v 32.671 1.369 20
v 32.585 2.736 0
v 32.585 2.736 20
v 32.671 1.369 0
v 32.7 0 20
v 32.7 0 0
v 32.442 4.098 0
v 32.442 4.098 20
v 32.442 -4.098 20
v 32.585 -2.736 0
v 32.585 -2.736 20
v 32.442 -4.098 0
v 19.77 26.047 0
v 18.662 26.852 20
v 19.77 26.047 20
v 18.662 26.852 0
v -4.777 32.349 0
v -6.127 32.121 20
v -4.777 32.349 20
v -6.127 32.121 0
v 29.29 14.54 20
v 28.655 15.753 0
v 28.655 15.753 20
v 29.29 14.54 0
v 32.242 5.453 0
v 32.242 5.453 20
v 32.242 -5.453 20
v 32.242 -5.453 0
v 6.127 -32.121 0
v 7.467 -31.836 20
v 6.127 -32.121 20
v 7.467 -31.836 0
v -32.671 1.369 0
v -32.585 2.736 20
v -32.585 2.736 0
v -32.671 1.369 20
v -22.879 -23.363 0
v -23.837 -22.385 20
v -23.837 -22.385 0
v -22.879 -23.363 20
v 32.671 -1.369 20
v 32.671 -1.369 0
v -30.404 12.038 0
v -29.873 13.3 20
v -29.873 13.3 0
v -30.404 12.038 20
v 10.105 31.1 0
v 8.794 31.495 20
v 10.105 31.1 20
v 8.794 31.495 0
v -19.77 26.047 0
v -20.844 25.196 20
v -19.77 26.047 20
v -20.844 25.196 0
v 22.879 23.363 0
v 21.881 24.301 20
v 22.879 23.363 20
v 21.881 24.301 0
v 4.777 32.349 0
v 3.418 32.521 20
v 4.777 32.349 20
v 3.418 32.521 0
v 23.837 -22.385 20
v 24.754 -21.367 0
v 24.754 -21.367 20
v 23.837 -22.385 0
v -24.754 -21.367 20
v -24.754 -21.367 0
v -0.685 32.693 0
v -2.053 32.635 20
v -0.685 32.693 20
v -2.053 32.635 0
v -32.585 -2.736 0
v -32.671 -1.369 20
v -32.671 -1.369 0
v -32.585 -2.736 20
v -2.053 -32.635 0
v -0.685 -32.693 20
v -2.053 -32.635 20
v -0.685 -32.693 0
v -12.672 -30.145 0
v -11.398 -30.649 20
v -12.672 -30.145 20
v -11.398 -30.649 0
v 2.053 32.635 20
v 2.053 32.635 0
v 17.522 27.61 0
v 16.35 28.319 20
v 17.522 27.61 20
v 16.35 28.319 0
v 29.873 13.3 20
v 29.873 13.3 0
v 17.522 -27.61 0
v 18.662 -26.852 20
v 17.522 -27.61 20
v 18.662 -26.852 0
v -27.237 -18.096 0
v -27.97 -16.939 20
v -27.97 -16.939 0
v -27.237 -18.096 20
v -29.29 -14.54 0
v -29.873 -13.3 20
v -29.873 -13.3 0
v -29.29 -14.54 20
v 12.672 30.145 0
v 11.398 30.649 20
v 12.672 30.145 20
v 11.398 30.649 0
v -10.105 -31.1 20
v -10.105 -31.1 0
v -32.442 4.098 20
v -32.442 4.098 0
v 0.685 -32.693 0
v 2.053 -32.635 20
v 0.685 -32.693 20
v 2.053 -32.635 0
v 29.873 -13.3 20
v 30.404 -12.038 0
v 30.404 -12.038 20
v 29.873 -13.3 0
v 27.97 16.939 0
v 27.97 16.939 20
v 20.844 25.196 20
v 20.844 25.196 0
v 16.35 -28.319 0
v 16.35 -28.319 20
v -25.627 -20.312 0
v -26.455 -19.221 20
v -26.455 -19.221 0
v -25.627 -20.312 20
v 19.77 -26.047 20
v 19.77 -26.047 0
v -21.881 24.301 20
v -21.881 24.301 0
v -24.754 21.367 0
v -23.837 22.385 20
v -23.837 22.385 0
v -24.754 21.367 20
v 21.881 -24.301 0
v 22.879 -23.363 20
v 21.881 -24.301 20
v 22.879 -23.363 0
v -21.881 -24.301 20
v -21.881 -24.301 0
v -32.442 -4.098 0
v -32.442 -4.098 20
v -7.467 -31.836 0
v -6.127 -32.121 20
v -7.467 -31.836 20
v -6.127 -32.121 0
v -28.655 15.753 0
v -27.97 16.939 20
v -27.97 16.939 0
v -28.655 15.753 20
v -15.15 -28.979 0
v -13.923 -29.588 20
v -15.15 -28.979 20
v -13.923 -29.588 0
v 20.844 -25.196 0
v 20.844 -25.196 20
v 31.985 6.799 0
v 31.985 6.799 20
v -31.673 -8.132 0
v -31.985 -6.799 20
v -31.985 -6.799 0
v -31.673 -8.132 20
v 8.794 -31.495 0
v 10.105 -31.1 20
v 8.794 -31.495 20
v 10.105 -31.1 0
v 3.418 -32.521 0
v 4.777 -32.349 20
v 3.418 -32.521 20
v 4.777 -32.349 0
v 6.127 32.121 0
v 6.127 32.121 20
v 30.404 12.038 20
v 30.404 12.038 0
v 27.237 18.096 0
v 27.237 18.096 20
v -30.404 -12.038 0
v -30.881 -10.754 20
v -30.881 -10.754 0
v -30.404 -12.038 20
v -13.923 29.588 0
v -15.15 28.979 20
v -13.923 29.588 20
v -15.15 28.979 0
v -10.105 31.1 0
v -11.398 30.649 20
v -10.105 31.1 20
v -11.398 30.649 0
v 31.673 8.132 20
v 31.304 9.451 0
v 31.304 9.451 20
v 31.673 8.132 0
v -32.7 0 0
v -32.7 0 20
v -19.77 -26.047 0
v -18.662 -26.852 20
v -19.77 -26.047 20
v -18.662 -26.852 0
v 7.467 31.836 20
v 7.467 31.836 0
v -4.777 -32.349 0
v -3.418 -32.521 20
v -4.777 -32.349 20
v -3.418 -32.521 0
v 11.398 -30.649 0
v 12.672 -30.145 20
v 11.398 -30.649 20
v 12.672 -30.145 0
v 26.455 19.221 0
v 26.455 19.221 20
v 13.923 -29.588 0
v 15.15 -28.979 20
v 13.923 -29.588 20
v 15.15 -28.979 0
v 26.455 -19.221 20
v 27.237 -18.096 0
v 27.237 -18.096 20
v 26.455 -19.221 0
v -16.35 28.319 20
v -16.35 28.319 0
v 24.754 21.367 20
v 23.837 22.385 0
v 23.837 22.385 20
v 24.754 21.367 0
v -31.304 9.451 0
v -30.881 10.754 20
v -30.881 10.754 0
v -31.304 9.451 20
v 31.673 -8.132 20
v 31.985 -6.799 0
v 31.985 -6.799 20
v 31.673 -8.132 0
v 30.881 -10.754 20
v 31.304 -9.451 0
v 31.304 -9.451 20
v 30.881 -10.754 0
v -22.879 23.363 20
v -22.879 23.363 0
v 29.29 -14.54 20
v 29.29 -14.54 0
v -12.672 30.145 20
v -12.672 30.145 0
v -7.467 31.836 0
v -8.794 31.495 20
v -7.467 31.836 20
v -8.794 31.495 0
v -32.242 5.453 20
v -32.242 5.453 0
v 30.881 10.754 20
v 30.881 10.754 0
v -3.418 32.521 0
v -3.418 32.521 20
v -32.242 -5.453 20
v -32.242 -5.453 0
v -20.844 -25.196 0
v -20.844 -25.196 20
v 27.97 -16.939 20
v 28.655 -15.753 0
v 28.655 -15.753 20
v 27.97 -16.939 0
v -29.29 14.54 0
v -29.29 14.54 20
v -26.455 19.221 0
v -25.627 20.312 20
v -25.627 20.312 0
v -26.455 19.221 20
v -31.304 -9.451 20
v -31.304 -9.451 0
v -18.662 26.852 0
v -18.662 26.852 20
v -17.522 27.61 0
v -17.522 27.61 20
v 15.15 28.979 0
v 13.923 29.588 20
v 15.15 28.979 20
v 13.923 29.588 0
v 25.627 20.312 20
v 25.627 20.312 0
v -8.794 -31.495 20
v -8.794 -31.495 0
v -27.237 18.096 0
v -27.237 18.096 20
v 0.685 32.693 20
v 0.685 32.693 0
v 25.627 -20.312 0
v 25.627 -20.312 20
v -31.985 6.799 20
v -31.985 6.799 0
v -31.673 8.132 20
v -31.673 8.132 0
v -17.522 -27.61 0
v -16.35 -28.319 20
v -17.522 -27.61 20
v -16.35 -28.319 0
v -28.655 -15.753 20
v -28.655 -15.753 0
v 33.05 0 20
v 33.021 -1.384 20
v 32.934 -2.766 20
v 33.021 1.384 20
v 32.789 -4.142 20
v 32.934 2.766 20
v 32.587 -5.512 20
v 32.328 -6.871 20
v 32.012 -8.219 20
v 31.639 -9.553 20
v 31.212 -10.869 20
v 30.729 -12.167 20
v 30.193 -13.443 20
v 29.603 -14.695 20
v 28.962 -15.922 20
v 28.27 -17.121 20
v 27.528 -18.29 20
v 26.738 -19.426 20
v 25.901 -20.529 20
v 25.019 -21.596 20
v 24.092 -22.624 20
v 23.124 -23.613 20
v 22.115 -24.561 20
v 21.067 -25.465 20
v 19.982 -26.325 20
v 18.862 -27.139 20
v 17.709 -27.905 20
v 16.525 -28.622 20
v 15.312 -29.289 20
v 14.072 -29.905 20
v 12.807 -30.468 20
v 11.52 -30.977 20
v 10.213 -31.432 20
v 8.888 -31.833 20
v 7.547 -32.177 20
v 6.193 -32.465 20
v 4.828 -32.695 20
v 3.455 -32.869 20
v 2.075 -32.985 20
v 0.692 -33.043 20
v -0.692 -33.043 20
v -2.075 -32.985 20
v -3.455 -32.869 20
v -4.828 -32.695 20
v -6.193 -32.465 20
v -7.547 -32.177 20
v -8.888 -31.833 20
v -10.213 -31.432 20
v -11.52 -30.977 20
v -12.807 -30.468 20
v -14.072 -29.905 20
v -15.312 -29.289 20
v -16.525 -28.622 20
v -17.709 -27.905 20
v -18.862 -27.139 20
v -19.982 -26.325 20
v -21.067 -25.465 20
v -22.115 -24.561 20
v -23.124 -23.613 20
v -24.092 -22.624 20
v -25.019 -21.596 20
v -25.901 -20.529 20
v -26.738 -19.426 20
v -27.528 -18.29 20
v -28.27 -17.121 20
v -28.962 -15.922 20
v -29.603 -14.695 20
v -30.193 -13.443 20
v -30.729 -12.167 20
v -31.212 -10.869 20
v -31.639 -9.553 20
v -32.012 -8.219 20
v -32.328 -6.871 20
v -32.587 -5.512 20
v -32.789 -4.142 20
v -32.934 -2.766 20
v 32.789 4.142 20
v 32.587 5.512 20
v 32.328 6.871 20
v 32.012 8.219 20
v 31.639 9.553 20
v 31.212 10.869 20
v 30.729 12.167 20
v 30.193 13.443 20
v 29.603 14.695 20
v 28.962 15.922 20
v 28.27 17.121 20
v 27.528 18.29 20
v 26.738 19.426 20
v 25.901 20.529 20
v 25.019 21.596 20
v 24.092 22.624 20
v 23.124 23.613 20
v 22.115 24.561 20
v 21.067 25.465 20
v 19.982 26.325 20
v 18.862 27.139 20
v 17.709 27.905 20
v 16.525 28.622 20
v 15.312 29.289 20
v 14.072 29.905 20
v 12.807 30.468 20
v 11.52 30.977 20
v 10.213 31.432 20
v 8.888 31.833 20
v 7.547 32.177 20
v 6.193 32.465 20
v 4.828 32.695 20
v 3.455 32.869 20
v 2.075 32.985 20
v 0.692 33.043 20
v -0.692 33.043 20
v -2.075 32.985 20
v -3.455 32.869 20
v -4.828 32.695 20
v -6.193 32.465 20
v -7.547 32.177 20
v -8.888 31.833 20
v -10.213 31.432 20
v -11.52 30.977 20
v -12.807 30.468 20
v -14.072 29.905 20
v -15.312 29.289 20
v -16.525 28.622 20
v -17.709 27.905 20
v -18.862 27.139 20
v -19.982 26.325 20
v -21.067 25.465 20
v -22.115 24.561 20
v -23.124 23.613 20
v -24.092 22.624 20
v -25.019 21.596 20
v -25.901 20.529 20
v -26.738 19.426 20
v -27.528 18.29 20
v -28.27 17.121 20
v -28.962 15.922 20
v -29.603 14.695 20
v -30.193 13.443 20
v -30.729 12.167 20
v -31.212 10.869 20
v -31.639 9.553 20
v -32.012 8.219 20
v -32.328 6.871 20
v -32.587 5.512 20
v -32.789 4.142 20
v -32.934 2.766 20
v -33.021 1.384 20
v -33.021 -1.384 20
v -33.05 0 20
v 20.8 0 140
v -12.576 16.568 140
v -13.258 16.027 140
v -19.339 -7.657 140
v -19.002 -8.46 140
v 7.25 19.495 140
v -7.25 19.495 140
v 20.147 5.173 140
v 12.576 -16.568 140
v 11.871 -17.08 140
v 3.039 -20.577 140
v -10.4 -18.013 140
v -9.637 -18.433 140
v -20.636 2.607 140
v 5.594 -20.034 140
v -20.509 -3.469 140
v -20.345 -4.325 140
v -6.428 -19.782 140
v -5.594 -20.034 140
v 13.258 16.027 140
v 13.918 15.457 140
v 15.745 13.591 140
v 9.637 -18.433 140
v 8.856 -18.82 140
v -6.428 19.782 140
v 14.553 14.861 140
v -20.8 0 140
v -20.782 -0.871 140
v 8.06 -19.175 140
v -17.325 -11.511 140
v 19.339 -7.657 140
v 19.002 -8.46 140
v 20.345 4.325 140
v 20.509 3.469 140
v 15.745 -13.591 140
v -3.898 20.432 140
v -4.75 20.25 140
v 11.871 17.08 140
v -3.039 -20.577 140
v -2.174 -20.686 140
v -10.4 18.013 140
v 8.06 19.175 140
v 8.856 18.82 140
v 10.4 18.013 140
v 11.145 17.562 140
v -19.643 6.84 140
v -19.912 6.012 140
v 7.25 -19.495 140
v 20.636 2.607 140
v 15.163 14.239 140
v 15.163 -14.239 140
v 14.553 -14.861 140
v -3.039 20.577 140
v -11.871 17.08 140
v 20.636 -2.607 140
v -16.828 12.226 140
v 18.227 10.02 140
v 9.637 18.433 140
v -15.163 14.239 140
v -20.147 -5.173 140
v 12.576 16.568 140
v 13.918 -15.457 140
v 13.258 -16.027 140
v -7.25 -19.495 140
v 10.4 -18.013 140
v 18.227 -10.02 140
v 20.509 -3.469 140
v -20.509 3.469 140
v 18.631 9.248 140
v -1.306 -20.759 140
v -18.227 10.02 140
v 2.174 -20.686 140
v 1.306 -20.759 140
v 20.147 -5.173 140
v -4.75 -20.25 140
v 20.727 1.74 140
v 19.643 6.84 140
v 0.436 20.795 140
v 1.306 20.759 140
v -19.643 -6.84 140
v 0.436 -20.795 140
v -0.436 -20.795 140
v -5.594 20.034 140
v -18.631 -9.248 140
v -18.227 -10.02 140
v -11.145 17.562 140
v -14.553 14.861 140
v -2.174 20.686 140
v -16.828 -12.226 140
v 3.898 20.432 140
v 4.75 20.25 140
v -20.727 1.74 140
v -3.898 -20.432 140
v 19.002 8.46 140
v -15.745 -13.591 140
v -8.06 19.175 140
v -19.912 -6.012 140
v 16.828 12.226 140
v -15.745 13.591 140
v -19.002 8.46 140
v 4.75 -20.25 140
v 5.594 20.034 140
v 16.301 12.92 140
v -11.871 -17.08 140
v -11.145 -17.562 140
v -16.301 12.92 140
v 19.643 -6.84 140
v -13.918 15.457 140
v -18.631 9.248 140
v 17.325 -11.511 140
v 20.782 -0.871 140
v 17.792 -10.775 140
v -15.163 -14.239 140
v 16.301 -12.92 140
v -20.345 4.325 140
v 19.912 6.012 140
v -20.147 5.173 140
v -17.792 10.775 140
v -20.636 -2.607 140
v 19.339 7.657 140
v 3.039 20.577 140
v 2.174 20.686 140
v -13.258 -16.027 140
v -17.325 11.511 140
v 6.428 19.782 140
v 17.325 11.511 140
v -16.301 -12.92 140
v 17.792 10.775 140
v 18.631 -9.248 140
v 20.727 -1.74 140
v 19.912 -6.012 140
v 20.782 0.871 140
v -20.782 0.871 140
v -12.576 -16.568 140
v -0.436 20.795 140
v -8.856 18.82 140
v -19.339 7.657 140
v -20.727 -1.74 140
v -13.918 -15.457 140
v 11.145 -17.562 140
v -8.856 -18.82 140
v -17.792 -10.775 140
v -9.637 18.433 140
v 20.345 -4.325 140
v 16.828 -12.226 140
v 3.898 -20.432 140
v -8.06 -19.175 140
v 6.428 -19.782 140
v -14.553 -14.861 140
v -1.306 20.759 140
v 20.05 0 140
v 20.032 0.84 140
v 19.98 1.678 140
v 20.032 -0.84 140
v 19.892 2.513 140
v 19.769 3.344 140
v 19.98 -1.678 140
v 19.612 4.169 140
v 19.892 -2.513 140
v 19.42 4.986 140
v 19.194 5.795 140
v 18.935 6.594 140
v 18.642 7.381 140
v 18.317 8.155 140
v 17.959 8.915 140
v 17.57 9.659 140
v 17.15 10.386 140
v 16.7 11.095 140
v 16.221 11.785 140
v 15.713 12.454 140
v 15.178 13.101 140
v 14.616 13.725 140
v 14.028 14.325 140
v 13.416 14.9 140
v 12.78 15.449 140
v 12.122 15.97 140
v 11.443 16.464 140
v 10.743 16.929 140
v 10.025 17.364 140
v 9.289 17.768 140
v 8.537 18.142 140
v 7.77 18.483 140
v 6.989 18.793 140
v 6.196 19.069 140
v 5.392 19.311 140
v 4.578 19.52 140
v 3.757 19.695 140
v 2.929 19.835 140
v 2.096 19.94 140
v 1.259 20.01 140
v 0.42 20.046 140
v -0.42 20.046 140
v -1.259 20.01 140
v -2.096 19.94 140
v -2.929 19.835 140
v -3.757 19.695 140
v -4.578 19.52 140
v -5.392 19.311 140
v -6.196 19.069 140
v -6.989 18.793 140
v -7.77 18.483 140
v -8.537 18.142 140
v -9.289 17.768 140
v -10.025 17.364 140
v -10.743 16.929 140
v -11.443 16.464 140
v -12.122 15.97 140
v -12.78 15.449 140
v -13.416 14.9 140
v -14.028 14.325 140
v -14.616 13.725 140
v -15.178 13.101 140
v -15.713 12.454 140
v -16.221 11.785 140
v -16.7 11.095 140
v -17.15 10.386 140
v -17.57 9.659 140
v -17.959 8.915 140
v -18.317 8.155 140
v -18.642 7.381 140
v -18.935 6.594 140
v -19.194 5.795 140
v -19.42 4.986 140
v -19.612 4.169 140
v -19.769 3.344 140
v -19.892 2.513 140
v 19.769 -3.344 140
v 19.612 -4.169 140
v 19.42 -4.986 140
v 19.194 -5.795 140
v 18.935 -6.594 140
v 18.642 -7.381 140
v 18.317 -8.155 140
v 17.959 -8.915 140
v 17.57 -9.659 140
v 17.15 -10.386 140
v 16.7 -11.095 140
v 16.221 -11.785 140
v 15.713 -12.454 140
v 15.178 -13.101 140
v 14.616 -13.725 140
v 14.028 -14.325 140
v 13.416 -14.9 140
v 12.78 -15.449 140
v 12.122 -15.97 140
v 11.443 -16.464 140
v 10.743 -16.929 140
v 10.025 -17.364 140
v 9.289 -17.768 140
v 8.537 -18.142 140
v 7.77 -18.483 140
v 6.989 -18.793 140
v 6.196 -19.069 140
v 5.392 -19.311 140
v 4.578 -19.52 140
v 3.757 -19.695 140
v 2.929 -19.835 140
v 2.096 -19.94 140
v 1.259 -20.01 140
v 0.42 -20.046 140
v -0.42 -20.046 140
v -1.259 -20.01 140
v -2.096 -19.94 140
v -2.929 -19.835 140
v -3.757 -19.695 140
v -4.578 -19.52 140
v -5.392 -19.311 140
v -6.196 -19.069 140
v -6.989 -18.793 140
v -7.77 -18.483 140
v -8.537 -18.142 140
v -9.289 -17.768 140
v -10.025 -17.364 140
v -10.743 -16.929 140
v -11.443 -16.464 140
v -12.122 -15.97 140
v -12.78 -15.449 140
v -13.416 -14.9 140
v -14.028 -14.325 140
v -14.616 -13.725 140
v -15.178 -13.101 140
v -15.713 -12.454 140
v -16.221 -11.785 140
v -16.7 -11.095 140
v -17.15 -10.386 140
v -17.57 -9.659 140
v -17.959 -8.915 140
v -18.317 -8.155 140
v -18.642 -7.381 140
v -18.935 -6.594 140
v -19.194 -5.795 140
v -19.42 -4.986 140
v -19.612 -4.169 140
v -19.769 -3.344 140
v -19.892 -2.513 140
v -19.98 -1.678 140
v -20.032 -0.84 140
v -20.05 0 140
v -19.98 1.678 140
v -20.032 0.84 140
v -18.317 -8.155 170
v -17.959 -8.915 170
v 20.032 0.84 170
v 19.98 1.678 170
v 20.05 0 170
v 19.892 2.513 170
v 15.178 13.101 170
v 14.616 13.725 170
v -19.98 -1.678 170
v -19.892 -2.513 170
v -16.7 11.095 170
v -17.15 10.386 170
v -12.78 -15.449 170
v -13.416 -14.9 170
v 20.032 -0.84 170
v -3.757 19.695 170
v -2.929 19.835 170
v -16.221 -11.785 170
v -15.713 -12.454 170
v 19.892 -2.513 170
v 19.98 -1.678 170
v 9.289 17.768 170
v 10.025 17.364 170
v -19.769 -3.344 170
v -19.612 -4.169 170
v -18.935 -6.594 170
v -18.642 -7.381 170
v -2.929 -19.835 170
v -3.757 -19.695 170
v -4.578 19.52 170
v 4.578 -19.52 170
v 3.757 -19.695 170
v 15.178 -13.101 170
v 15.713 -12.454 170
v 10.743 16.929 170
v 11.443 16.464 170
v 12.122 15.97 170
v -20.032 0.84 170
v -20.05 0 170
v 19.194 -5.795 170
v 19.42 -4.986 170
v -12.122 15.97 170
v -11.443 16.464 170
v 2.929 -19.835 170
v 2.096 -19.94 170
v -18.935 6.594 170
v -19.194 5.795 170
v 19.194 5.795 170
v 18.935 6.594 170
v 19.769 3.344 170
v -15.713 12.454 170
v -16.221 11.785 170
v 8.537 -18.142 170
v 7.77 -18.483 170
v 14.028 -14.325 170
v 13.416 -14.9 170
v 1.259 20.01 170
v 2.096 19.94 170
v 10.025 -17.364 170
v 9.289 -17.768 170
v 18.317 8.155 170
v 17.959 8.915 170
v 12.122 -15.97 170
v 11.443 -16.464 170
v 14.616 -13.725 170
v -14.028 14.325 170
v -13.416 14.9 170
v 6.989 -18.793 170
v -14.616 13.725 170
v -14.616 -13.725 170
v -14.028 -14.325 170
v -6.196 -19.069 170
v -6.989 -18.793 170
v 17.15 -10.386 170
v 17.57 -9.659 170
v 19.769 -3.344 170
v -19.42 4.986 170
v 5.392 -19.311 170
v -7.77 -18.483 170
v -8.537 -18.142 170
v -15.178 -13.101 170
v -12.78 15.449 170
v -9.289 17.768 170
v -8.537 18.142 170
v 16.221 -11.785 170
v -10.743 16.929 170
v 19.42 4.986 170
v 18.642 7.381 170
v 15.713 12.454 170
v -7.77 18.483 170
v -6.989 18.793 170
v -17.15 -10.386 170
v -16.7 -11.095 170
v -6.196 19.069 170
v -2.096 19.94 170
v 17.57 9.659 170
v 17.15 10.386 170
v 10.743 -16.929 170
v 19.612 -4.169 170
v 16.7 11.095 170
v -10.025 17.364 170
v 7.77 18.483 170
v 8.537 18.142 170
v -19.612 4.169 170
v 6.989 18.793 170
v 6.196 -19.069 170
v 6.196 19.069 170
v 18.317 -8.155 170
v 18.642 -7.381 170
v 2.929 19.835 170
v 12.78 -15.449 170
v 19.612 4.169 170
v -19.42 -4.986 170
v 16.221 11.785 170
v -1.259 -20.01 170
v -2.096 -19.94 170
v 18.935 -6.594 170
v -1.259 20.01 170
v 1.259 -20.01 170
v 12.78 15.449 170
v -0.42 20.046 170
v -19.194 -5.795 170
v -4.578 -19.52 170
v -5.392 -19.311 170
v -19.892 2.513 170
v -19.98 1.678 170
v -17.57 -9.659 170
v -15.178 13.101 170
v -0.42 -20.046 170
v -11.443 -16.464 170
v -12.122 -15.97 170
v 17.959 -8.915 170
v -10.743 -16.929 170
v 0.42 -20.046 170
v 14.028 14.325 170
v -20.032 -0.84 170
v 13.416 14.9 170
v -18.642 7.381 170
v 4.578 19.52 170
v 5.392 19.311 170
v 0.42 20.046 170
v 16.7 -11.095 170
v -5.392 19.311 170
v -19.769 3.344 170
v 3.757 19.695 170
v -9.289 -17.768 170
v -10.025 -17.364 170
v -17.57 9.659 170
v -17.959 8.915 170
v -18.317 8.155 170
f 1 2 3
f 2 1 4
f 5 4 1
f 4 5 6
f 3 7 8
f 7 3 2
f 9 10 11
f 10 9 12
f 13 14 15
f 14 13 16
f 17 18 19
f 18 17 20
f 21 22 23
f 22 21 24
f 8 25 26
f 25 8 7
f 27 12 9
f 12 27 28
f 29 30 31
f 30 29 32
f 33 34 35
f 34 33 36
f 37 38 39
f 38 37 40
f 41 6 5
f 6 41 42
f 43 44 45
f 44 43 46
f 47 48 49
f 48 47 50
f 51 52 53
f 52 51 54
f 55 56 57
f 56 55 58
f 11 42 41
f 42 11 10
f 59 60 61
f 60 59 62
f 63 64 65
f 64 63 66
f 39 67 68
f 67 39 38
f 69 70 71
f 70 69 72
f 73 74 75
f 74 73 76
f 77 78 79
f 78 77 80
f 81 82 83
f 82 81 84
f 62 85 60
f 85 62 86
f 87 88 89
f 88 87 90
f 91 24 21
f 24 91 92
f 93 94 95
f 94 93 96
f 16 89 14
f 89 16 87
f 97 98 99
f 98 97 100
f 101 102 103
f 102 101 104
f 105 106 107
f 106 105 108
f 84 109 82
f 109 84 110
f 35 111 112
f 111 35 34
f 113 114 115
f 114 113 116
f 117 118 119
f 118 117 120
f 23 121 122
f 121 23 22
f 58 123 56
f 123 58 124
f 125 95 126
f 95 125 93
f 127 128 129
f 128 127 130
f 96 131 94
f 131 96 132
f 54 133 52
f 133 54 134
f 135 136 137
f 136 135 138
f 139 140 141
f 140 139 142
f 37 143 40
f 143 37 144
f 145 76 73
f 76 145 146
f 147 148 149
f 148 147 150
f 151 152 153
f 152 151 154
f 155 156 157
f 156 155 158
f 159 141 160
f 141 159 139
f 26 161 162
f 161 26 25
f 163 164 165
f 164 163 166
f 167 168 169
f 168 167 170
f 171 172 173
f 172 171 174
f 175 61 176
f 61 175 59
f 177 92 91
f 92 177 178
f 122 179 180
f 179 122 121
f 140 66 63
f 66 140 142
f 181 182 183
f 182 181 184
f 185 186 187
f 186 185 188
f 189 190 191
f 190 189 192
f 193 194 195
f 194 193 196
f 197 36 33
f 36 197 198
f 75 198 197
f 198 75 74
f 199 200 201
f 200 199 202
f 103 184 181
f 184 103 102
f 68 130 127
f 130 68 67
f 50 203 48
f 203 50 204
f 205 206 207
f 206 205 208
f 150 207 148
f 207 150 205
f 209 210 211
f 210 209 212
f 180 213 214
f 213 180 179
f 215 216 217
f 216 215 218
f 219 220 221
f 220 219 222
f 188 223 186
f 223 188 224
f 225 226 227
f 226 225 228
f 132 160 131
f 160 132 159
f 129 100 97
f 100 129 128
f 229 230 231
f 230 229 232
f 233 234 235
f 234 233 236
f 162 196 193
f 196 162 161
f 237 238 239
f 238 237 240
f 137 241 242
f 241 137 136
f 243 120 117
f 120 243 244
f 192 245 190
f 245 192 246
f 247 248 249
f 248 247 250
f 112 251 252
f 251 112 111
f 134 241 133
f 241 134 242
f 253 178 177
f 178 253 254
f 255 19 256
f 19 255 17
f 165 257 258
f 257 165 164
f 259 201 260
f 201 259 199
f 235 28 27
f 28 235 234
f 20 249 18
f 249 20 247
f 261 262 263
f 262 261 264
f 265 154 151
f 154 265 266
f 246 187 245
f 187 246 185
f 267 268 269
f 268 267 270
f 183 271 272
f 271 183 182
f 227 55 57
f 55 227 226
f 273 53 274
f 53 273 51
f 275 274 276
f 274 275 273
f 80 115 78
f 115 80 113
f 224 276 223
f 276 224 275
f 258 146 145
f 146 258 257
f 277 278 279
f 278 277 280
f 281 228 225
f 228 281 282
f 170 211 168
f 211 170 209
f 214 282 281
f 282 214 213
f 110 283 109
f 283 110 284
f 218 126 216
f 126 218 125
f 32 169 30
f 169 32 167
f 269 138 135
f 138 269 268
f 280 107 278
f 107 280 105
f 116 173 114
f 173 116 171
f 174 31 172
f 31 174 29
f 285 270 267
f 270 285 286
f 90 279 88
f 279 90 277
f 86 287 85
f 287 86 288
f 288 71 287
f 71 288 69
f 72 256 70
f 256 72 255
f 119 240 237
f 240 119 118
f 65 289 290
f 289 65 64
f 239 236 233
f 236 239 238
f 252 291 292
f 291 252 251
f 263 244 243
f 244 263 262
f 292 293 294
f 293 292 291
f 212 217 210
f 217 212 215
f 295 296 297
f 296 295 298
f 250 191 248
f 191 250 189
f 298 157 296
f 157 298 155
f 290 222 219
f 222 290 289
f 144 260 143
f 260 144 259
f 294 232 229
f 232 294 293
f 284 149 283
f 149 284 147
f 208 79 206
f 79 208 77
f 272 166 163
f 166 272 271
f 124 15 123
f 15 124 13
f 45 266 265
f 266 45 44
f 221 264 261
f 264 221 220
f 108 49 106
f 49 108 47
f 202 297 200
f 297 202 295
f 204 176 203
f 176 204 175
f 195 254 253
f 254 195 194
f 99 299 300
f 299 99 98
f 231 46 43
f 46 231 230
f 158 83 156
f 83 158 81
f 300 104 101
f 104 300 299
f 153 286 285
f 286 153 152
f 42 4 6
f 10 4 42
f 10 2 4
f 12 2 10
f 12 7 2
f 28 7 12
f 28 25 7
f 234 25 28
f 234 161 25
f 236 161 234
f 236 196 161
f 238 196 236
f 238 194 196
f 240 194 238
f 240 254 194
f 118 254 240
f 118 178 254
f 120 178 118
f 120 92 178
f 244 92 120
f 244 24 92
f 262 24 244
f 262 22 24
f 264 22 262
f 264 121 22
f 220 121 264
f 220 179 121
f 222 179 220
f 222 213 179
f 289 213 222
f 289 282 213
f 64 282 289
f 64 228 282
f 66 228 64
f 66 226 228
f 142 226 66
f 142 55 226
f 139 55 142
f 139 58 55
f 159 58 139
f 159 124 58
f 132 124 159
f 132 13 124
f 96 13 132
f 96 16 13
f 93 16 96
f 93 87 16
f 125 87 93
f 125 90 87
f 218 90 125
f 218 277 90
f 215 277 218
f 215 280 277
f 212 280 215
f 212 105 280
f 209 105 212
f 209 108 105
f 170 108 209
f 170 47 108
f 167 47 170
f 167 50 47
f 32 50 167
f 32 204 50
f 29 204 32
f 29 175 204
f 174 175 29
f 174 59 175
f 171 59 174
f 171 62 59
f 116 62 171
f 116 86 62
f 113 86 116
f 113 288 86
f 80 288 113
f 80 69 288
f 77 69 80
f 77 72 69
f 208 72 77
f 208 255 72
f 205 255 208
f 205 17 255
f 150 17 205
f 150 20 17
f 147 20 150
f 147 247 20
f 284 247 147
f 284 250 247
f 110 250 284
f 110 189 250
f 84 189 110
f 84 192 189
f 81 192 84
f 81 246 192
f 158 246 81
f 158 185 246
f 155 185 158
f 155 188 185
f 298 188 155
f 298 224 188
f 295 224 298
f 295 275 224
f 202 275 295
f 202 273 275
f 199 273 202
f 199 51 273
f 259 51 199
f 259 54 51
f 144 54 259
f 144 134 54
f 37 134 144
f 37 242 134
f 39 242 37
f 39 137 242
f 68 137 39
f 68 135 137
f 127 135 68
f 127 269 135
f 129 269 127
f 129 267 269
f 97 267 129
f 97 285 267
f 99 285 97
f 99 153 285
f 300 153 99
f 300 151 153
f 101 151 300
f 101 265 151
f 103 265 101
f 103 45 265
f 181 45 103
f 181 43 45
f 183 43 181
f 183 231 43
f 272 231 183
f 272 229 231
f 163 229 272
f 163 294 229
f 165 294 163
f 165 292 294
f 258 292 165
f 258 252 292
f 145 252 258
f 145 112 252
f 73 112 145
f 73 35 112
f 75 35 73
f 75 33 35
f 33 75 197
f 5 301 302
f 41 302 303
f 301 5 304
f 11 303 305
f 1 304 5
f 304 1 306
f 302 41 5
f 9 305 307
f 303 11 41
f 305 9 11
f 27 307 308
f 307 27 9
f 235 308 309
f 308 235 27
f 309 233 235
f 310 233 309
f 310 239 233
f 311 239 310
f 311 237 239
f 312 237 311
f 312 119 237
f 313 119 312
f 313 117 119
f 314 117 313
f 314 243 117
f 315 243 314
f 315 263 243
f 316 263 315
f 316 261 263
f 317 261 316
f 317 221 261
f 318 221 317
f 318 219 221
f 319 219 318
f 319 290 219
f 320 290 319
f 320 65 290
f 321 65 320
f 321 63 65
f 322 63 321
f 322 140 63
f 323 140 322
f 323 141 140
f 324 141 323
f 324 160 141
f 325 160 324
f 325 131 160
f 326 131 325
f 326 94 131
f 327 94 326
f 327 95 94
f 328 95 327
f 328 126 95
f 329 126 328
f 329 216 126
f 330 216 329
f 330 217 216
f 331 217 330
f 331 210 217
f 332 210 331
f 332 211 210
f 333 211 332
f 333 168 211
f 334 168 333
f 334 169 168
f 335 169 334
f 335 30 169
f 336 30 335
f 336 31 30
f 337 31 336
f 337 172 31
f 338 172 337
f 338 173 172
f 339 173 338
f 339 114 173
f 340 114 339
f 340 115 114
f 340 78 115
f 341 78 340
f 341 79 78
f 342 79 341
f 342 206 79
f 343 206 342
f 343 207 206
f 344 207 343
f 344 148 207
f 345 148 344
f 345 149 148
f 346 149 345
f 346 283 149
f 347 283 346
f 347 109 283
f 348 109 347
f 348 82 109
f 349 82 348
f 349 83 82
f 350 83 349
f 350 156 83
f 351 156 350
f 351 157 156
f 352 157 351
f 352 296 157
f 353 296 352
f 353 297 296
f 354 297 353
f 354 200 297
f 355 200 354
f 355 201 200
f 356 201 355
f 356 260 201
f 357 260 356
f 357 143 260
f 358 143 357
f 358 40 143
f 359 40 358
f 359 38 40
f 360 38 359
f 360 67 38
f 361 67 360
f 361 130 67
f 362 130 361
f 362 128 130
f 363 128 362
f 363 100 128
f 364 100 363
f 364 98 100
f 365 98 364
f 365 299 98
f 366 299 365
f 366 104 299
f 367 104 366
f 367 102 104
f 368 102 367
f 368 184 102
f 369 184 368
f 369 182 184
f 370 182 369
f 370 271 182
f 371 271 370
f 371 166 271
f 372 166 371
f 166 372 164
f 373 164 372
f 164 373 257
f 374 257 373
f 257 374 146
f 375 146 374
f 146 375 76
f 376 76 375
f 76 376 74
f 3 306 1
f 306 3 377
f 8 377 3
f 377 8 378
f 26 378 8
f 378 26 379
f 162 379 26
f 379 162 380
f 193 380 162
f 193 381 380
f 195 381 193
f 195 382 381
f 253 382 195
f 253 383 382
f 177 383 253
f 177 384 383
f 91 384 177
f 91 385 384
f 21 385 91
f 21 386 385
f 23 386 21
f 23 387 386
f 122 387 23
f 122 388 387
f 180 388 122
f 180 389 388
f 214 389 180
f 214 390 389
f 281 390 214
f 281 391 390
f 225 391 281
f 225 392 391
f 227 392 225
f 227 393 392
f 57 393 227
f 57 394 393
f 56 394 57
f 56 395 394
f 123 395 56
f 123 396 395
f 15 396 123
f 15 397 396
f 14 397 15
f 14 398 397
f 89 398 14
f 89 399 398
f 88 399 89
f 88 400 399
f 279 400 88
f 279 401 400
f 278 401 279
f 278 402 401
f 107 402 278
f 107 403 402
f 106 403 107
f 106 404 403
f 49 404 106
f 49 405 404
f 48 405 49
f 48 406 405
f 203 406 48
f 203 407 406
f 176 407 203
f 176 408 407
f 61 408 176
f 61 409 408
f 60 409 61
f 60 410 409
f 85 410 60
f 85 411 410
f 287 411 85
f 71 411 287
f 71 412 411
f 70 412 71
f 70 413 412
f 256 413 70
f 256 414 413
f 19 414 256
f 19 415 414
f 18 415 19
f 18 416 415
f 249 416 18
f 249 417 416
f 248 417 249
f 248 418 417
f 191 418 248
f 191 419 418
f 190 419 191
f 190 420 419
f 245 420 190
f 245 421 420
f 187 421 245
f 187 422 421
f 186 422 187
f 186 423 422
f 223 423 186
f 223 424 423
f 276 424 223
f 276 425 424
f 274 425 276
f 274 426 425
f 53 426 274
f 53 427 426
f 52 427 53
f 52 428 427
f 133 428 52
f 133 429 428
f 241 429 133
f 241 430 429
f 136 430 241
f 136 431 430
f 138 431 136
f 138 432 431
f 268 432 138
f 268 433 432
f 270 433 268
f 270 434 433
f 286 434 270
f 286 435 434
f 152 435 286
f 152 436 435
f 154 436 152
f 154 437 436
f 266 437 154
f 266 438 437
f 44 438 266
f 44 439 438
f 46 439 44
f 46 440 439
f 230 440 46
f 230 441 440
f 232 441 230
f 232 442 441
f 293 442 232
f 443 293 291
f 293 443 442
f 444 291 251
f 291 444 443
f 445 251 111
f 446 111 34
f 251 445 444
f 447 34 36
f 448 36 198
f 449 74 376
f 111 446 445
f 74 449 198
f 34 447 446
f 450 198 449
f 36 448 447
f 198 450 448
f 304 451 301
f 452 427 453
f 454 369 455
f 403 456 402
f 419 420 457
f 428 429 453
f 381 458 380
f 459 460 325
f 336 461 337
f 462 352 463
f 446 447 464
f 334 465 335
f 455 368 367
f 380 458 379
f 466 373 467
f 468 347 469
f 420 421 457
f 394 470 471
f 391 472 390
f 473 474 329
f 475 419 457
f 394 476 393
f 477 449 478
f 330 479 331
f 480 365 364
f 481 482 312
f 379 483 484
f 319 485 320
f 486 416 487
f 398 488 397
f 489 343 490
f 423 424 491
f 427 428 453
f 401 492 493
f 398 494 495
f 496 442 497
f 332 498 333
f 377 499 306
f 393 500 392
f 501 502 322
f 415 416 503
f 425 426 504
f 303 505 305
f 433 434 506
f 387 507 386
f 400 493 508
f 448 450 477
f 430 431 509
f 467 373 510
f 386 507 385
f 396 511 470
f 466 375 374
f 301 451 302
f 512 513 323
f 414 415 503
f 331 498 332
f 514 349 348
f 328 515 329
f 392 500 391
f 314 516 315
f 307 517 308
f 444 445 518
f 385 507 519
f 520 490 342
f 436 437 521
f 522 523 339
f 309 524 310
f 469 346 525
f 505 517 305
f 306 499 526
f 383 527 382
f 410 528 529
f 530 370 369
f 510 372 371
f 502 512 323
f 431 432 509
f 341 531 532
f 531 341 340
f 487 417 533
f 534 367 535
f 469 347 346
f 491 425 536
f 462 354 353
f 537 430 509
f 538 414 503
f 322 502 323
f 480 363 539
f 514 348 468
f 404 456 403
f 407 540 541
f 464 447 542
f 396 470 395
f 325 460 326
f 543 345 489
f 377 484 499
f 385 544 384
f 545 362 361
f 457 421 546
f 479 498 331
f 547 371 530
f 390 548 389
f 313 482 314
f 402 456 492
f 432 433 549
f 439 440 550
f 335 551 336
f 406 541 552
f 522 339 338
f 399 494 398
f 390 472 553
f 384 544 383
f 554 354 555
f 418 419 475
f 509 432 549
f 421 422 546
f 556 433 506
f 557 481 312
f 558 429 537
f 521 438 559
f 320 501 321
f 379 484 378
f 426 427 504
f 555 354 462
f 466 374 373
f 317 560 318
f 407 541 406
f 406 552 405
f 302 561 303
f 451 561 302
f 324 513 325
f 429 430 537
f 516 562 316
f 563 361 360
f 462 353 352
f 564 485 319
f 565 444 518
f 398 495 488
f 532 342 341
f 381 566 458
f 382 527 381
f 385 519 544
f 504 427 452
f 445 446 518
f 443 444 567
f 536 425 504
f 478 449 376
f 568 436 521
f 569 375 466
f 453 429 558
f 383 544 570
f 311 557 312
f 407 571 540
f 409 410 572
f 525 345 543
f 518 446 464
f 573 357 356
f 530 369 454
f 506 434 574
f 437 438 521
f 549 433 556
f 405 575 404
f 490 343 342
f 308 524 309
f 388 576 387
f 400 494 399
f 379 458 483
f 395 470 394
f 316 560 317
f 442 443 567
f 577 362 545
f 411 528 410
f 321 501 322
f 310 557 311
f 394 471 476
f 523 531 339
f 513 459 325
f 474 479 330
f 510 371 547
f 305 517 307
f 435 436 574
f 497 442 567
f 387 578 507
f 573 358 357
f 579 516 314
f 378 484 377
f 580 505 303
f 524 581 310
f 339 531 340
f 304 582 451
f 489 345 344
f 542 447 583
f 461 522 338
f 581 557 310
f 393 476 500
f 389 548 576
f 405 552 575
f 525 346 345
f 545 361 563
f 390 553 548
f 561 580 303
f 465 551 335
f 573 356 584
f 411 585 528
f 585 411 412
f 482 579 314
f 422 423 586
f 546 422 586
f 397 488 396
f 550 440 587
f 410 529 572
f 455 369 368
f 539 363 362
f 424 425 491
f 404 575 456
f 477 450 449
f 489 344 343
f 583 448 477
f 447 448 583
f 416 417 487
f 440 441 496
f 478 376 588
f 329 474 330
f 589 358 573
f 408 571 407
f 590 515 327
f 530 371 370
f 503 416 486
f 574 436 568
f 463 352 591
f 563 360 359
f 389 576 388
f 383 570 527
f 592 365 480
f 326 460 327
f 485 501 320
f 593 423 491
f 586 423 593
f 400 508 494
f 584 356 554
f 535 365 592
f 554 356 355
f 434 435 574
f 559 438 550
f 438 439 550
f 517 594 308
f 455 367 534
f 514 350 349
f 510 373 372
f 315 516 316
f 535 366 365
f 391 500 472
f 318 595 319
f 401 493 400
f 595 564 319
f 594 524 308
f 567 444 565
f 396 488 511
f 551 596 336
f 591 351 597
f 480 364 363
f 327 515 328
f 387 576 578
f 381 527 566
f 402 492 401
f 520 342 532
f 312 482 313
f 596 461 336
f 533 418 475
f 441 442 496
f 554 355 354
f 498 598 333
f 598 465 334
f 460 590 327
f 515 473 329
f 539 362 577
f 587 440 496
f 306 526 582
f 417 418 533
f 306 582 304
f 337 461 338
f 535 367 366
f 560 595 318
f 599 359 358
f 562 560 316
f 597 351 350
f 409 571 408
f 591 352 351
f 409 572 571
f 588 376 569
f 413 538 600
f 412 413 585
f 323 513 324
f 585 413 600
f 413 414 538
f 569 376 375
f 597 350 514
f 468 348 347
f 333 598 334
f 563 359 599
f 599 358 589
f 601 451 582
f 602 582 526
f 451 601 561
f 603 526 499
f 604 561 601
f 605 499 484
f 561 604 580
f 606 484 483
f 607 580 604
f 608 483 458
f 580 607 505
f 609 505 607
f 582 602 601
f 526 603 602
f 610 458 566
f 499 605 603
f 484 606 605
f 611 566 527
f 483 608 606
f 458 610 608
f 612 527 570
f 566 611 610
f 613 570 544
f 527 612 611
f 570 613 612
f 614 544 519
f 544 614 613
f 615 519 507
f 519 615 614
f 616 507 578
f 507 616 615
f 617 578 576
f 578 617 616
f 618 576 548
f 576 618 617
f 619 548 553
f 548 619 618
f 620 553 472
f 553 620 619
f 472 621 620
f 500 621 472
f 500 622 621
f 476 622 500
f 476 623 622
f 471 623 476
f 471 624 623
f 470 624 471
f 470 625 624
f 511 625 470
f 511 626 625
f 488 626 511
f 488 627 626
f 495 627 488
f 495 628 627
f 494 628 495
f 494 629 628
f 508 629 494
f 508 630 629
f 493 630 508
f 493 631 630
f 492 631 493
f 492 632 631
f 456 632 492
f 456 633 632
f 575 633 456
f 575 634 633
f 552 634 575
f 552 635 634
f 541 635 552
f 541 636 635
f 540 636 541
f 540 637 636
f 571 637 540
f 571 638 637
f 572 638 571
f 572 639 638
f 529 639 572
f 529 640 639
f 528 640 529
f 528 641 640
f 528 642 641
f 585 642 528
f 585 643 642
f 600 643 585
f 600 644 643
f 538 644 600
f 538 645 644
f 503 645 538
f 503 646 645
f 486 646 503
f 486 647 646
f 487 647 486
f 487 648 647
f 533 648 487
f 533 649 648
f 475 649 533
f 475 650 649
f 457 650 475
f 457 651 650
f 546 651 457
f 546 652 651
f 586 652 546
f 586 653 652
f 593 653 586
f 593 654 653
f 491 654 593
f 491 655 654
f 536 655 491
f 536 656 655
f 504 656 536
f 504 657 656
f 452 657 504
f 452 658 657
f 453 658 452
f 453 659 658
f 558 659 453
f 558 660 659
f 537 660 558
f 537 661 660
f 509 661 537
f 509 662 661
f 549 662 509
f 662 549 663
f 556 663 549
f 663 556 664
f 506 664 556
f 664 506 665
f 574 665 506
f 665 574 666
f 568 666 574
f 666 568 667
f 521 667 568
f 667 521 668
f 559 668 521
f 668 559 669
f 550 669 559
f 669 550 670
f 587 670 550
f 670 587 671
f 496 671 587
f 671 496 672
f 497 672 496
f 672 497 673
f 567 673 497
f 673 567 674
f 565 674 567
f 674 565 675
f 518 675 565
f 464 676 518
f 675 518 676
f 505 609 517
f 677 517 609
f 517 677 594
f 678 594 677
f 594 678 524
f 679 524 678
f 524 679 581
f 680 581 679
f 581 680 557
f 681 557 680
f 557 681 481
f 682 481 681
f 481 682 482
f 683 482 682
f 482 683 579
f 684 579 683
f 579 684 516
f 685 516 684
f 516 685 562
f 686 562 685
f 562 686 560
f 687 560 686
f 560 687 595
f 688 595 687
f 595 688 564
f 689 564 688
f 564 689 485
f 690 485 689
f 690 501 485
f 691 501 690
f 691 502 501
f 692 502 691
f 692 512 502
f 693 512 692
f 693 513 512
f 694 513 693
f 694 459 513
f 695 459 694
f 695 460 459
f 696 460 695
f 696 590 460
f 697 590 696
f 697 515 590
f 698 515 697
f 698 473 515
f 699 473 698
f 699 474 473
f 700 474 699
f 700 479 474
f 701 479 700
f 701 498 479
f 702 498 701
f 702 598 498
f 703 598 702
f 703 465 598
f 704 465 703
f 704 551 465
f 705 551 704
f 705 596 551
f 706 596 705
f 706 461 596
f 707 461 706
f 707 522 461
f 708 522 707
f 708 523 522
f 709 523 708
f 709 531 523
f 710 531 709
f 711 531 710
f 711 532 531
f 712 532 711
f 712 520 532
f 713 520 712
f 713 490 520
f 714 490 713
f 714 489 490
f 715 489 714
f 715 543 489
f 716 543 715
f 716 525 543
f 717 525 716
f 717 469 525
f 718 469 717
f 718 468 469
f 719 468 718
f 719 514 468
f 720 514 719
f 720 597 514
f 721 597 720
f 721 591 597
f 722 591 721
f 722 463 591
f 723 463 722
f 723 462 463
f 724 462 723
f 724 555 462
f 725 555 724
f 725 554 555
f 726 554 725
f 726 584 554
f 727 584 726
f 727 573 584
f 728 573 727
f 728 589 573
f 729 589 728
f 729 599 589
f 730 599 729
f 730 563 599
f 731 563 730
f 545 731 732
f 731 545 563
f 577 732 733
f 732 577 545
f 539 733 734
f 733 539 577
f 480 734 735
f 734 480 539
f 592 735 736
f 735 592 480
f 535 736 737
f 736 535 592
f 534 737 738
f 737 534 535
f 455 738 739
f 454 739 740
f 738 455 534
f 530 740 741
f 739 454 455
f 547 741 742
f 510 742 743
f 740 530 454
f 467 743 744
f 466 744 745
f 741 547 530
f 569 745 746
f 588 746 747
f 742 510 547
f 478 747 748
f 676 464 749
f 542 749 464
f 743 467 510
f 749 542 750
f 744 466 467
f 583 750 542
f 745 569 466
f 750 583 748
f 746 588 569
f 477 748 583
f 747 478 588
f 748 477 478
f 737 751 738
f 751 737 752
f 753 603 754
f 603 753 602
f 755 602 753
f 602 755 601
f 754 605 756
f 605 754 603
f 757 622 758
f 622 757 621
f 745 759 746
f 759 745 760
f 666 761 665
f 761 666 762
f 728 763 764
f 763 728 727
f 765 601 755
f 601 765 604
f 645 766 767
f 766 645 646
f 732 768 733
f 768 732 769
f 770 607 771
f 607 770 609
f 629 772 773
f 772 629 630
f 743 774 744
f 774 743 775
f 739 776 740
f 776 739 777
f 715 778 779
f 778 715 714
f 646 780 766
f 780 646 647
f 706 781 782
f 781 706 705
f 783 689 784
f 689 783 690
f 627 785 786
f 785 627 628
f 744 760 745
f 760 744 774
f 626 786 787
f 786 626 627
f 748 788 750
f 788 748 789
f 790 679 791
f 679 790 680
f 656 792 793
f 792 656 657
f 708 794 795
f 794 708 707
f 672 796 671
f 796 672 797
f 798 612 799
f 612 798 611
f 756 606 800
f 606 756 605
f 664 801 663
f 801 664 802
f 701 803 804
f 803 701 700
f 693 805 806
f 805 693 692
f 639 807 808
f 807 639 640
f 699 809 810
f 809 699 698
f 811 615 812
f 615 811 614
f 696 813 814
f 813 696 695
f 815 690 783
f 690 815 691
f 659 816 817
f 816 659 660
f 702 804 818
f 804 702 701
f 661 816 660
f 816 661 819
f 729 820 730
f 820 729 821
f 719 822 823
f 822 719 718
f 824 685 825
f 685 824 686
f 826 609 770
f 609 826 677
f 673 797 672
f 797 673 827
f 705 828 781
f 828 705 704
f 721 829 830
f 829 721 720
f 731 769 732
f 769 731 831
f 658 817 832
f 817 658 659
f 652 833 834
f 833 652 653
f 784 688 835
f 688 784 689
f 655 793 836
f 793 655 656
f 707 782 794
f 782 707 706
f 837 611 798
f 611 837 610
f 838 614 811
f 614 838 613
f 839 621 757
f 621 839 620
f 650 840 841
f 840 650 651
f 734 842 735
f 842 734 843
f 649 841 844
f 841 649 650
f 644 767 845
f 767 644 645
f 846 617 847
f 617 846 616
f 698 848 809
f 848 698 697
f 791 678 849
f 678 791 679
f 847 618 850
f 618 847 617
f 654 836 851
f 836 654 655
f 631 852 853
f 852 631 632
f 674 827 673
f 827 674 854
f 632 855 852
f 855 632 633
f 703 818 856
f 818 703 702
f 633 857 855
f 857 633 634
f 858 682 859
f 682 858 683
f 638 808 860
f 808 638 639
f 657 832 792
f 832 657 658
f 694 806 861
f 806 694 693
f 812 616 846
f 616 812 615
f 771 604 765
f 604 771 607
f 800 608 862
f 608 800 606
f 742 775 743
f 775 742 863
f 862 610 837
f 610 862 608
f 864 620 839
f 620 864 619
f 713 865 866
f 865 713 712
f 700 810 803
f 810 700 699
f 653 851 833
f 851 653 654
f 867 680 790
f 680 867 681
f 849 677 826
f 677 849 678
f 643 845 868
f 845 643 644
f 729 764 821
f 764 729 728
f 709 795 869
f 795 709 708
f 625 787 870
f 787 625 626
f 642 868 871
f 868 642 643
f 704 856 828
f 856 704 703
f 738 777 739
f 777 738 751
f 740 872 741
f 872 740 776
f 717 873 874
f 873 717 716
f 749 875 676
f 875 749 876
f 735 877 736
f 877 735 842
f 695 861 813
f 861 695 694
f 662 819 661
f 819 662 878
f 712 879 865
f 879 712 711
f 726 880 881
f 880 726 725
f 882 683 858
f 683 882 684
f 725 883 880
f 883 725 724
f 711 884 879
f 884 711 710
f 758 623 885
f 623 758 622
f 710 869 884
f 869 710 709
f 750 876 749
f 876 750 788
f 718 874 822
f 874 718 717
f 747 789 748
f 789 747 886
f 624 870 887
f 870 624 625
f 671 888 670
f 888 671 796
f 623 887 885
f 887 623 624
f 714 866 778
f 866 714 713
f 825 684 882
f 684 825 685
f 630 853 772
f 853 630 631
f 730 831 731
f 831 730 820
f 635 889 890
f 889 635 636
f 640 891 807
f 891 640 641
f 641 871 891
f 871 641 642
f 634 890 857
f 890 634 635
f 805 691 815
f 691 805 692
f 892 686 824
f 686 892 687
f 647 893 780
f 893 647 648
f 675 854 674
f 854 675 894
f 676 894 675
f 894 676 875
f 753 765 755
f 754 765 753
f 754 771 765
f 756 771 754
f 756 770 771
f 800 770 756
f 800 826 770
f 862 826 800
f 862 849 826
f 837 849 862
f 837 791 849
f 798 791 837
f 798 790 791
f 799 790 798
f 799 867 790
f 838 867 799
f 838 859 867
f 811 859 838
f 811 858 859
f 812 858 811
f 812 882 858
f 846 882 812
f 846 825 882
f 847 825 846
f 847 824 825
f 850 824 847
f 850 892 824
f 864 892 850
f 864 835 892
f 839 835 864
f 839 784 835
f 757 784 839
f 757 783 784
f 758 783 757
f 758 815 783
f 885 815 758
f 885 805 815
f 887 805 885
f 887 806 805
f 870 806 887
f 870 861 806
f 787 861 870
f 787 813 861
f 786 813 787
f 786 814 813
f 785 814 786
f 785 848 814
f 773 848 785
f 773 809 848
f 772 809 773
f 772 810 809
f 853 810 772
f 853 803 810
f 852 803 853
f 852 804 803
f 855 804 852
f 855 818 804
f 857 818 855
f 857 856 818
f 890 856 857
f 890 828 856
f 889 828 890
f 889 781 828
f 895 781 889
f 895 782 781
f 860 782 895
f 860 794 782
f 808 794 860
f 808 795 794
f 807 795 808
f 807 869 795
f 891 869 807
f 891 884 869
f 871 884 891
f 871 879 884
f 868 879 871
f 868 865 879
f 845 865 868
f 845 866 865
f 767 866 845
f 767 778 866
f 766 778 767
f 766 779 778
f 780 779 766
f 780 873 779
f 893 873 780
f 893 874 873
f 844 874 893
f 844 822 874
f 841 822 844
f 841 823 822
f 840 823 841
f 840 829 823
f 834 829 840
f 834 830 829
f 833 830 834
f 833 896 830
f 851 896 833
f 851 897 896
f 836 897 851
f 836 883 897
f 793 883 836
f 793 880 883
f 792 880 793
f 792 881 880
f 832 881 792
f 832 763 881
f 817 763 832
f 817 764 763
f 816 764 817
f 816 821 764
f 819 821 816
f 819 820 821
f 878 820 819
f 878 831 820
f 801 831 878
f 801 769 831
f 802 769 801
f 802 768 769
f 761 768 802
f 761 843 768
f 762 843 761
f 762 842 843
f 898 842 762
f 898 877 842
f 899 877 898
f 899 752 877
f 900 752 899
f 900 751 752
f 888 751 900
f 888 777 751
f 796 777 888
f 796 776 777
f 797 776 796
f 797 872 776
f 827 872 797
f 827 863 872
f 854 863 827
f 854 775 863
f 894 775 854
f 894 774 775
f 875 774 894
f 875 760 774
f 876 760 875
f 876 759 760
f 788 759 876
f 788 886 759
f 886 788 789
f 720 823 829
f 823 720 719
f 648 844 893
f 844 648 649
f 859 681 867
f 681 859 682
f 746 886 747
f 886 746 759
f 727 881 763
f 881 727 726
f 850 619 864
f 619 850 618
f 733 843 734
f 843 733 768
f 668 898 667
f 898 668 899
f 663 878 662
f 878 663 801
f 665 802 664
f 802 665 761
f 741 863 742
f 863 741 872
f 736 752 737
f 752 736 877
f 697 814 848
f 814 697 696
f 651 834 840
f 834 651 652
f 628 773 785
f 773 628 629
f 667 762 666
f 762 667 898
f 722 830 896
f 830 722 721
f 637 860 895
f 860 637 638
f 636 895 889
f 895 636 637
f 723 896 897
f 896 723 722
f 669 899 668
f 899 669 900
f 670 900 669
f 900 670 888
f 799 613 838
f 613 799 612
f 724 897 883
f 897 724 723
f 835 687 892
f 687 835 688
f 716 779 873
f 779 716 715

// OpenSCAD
// variable description
shoulder1_diameter = 65.4;
shoulder1_length = 20;
transition_diameter_1 = 66.1;
transition_length = 120;
transition_diameter_2 = 41.6;
shoulder2_diameter = 40.1;
shoulder2_length = 30;
// 

$fn=150;
union(){
translate([0,0,shoulder1_length/2])cylinder(shoulder1_length,shoulder1_diameter/2,shoulder1_diameter/2,center=true);
translate([0,0,(transition_length/2 +shoulder1_length )])cylinder(transition_length,transition_diameter_1/2,transition_diameter_2/2,center=true);
translate([0,0,(shoulder1_length + transition_length + shoulder2_length/2)])cylinder(shoulder2_length,shoulder2_diameter/2,shoulder2_diameter/2,center=true);
}
